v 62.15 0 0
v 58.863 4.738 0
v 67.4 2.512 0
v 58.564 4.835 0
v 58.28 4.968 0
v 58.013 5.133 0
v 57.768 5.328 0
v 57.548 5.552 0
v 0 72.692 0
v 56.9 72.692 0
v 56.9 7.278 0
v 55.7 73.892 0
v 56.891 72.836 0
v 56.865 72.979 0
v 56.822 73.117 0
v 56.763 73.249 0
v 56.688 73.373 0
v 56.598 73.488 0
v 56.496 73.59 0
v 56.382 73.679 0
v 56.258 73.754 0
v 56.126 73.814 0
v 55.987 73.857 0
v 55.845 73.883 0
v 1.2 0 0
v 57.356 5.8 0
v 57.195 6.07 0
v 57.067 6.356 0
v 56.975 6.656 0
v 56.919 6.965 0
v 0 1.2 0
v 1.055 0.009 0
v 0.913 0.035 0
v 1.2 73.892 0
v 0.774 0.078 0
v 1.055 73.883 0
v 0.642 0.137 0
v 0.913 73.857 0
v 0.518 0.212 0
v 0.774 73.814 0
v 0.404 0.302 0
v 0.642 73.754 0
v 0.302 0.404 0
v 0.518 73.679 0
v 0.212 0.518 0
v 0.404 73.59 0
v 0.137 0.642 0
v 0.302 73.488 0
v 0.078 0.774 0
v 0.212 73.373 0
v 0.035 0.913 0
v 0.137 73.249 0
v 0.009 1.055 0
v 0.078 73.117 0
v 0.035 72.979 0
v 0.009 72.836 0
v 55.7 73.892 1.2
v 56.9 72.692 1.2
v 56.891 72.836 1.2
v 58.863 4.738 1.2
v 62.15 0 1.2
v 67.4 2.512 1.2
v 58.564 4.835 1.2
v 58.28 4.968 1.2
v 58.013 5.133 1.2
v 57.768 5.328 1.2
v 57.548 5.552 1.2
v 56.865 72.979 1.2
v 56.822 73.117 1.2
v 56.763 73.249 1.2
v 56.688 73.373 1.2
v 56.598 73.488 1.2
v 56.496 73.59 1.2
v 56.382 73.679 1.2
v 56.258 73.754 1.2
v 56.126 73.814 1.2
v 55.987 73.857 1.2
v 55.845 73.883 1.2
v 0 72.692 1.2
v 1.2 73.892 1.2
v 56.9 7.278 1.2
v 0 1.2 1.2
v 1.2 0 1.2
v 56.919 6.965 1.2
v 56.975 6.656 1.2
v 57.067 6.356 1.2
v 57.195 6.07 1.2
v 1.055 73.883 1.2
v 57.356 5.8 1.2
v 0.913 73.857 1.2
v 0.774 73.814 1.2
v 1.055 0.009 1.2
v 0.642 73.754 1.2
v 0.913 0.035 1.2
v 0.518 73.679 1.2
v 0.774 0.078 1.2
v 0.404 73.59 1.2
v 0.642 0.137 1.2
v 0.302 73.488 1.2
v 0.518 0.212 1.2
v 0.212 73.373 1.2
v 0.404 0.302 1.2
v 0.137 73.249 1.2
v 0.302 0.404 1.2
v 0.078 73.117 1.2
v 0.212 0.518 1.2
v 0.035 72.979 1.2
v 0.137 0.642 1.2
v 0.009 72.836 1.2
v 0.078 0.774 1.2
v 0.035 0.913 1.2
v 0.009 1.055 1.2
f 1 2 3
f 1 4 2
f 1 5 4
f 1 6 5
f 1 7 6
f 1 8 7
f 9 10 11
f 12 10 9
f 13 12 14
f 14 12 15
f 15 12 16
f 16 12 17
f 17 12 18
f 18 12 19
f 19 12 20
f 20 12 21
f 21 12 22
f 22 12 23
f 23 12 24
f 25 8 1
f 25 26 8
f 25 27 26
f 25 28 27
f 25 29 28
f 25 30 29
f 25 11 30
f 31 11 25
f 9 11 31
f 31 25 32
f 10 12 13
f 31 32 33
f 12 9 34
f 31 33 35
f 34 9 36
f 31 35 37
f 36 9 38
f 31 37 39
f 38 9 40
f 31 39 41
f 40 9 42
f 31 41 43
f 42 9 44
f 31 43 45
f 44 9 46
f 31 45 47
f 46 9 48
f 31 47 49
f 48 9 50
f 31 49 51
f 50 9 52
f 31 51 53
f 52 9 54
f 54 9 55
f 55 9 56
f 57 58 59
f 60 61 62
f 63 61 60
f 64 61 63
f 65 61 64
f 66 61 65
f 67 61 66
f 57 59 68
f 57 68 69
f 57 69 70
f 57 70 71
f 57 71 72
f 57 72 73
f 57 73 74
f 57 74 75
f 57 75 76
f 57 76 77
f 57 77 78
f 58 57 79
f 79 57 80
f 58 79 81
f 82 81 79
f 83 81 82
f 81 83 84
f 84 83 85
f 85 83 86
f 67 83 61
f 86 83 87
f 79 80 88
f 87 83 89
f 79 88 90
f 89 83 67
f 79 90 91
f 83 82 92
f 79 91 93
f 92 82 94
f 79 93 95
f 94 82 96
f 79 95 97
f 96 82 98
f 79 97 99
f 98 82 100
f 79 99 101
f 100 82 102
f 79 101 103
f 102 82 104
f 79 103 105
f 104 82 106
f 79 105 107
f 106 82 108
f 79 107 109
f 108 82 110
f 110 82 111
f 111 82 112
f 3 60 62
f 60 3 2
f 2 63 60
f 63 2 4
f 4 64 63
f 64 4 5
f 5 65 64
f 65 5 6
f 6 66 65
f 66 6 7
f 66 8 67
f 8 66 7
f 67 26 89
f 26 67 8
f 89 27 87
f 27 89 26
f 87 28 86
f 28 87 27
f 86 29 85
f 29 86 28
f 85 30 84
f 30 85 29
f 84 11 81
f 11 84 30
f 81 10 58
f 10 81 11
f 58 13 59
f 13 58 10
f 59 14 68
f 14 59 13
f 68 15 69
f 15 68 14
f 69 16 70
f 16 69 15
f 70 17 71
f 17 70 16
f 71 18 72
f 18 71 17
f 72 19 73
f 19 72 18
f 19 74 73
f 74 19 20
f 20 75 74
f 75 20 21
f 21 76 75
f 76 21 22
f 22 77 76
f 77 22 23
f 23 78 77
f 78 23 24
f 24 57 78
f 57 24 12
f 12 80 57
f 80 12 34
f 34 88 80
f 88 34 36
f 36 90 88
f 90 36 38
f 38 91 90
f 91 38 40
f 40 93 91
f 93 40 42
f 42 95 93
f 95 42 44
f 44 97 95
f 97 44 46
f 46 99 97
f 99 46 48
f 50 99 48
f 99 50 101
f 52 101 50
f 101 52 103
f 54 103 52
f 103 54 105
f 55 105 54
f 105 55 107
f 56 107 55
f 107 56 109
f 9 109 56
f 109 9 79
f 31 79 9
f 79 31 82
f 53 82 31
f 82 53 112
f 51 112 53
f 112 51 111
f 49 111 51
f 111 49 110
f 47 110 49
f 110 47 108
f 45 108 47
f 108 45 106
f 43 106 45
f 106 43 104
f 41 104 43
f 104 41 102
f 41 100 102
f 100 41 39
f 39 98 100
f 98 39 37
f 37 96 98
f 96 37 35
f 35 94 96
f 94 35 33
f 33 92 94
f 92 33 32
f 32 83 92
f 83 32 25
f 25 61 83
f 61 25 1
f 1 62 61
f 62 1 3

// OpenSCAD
// file: polyedge.scad
// Copyright (c) 2024 Robert Eisele ( https://raw.org ). All rights reserved.
// Licensed under the MIT license.

// https://raw.org/code/openscad-polygons-with-rounded-corners/


// Example: polyedge([ [x, y, t], ...]);
// The parameter t has the following options:
// = 0: If t is zero (or left out), the edge is becoming a normal sharp edge like in polygon()
// > 0: If t is positive, the edge will get a round corner with radius t
// < 0: If t is negative, the edge will get an inset of length -t from the original edge


function normalize (v) = v / norm(v);
function sgn(a, b) = sign(a[0] * b[1] - a[1] * b[0]);

module polyedge(pts, $fn=$fn) {

    polygon([for (L1 = [
        for (i = [1 : len(pts)])
        let(
            f = $fn == 0 ? 10 : $fn,
            A = pts[(i - 1)],
            B = pts[(i + 0) % len(pts)],
            C = pts[(i + 1) % len(pts)],

            r = B[2],
            S = [B[0], B[1]],
            a = normalize([A[0] - B[0], A[1] - B[1]]),
            b = normalize([C[0] - B[0], C[1] - B[1]]))

             (len(B) == 2 || B[2] == 0)
                ? [ S ]
                : (r < 0 
                    ? [ S - a * r, S - b * r ]
                    : [let(
                        w = r * sqrt(2 / (1 - a * b) - 1),
                        X = a * w,
                        Y = b * w,
                        M = (a + b) * (r / sqrt(1 - pow(a * b, 2))),
                        b1 = atan2(X[1] - M[1], X[0] - M[0]),
                        b2 = atan2(Y[1] - M[1], Y[0] - M[0]),
                        phi = sgn(a, b) * (sgn(a, b) * (b1 - b2) + 360) % 360,
                        segs = ceil(abs(phi) * f / 360)) 
                            for (j = [0 : segs]) 
                                B + M + [
                                    r * cos(b1 - j / segs * phi), 
                                    r * sin(b1 - j / segs * phi)]])]) for (L2 = L1) L2]); 
}
// main file
include <polyedge.scad>

battery_length=44.5;
battery_diameter=10.5;
batteries_in_row=5;
batteries_rows=1;
gap = 1;
tunnel_angle = 5;
funnel_angle = 55;
wall = 1.2;



tunnel_offset = battery_diameter + gap + wall + (sin(tunnel_angle) * battery_diameter);
width = battery_diameter*batteries_in_row + gap*2 + wall*2;
tunnel_upper_elevation = sin(tunnel_angle) * (width/2 - battery_diameter/2 - gap/2);
tunnel_lower_elevation = sin(tunnel_angle) * (width/2 + battery_diameter/2 + gap/2 + battery_diameter);
funnel_height = tan(funnel_angle) * width / 2;
height = tunnel_lower_elevation + tunnel_offset + battery_diameter/2 + funnel_height + battery_diameter*batteries_rows;



module front_side() {
    polyedge([ 
        [battery_diameter/2 + battery_diameter/4 + gap/2, tunnel_offset+tunnel_upper_elevation,wall], 
        [width / 2, tunnel_offset, wall],  
        [width / 2, height, wall], 
        [width / 2 - wall, height, 0],
        [width / 2 - wall, tunnel_offset + funnel_height + battery_diameter*1.5, battery_diameter],
        [battery_diameter/2 + gap/2, tunnel_offset+battery_diameter*1.5, battery_diameter/2], 
    ],$fn=50);
}

module back_side() {
    polyedge([
        [0,0,wall],
        [0,height,wall],
        [wall,height,0],
        [wall,tunnel_offset + funnel_height, battery_diameter],
        [width/2 - battery_diameter/4 - gap/2, tunnel_offset, battery_diameter/4],
        [width/2 - battery_diameter/4 - gap/2, tunnel_lower_elevation + wall, battery_diameter/2],
        [width+ battery_diameter, wall,battery_diameter/2],
        [width + battery_diameter, wall + battery_diameter/3*2, wall/2],
         [width + battery_diameter + wall , wall + battery_diameter/3*2,wall/2],
        [width + battery_diameter, 0,battery_diameter/2]
        ],$fn=50);
}

module side() {
    polyedge([
        [0,0,wall],
        [0,height,wall],
        [width,height,wall],
        [width,battery_diameter/2,battery_diameter/4],
        [width+battery_diameter,wall+battery_diameter/8,0],
        [width+battery_diameter/2,0,0],
        [width,0,0]
        ],$fn=50);
}

module battery() {
    circle(d=battery_diameter);
}

module batteries() {
translate([width/2+1,battery_diameter + 24,0]) battery();
translate([width/2-4,battery_diameter + 15,0]) battery();
translate([width/2+ gap + 2 ,battery_diameter+4 ,0]) battery();
translate([width/2+ 16, tunnel_offset/2 + gap +1,0]) battery();
translate([width - battery_diameter/2 +3 , tunnel_offset/2 + gap,0]) battery();

}

module three_sides() {
//    translate([0,0,wall]) linear_extrude(height = 10) {
//       batteries();
//    }
    linear_extrude(height = wall + battery_length + gap) {
        back_side();
        translate([width/2,0,0]) front_side();
    }
    linear_extrude(height = wall) 
        side();
}

module top_side() {
    mirror([1,0,0]) difference() {
        three_sides();
        translate([0,0,wall]) cube([width + battery_diameter, height, battery_length + gap]);
   } 
}

three_sides();
//translate([-10,0,0]) 
//    top_side();
